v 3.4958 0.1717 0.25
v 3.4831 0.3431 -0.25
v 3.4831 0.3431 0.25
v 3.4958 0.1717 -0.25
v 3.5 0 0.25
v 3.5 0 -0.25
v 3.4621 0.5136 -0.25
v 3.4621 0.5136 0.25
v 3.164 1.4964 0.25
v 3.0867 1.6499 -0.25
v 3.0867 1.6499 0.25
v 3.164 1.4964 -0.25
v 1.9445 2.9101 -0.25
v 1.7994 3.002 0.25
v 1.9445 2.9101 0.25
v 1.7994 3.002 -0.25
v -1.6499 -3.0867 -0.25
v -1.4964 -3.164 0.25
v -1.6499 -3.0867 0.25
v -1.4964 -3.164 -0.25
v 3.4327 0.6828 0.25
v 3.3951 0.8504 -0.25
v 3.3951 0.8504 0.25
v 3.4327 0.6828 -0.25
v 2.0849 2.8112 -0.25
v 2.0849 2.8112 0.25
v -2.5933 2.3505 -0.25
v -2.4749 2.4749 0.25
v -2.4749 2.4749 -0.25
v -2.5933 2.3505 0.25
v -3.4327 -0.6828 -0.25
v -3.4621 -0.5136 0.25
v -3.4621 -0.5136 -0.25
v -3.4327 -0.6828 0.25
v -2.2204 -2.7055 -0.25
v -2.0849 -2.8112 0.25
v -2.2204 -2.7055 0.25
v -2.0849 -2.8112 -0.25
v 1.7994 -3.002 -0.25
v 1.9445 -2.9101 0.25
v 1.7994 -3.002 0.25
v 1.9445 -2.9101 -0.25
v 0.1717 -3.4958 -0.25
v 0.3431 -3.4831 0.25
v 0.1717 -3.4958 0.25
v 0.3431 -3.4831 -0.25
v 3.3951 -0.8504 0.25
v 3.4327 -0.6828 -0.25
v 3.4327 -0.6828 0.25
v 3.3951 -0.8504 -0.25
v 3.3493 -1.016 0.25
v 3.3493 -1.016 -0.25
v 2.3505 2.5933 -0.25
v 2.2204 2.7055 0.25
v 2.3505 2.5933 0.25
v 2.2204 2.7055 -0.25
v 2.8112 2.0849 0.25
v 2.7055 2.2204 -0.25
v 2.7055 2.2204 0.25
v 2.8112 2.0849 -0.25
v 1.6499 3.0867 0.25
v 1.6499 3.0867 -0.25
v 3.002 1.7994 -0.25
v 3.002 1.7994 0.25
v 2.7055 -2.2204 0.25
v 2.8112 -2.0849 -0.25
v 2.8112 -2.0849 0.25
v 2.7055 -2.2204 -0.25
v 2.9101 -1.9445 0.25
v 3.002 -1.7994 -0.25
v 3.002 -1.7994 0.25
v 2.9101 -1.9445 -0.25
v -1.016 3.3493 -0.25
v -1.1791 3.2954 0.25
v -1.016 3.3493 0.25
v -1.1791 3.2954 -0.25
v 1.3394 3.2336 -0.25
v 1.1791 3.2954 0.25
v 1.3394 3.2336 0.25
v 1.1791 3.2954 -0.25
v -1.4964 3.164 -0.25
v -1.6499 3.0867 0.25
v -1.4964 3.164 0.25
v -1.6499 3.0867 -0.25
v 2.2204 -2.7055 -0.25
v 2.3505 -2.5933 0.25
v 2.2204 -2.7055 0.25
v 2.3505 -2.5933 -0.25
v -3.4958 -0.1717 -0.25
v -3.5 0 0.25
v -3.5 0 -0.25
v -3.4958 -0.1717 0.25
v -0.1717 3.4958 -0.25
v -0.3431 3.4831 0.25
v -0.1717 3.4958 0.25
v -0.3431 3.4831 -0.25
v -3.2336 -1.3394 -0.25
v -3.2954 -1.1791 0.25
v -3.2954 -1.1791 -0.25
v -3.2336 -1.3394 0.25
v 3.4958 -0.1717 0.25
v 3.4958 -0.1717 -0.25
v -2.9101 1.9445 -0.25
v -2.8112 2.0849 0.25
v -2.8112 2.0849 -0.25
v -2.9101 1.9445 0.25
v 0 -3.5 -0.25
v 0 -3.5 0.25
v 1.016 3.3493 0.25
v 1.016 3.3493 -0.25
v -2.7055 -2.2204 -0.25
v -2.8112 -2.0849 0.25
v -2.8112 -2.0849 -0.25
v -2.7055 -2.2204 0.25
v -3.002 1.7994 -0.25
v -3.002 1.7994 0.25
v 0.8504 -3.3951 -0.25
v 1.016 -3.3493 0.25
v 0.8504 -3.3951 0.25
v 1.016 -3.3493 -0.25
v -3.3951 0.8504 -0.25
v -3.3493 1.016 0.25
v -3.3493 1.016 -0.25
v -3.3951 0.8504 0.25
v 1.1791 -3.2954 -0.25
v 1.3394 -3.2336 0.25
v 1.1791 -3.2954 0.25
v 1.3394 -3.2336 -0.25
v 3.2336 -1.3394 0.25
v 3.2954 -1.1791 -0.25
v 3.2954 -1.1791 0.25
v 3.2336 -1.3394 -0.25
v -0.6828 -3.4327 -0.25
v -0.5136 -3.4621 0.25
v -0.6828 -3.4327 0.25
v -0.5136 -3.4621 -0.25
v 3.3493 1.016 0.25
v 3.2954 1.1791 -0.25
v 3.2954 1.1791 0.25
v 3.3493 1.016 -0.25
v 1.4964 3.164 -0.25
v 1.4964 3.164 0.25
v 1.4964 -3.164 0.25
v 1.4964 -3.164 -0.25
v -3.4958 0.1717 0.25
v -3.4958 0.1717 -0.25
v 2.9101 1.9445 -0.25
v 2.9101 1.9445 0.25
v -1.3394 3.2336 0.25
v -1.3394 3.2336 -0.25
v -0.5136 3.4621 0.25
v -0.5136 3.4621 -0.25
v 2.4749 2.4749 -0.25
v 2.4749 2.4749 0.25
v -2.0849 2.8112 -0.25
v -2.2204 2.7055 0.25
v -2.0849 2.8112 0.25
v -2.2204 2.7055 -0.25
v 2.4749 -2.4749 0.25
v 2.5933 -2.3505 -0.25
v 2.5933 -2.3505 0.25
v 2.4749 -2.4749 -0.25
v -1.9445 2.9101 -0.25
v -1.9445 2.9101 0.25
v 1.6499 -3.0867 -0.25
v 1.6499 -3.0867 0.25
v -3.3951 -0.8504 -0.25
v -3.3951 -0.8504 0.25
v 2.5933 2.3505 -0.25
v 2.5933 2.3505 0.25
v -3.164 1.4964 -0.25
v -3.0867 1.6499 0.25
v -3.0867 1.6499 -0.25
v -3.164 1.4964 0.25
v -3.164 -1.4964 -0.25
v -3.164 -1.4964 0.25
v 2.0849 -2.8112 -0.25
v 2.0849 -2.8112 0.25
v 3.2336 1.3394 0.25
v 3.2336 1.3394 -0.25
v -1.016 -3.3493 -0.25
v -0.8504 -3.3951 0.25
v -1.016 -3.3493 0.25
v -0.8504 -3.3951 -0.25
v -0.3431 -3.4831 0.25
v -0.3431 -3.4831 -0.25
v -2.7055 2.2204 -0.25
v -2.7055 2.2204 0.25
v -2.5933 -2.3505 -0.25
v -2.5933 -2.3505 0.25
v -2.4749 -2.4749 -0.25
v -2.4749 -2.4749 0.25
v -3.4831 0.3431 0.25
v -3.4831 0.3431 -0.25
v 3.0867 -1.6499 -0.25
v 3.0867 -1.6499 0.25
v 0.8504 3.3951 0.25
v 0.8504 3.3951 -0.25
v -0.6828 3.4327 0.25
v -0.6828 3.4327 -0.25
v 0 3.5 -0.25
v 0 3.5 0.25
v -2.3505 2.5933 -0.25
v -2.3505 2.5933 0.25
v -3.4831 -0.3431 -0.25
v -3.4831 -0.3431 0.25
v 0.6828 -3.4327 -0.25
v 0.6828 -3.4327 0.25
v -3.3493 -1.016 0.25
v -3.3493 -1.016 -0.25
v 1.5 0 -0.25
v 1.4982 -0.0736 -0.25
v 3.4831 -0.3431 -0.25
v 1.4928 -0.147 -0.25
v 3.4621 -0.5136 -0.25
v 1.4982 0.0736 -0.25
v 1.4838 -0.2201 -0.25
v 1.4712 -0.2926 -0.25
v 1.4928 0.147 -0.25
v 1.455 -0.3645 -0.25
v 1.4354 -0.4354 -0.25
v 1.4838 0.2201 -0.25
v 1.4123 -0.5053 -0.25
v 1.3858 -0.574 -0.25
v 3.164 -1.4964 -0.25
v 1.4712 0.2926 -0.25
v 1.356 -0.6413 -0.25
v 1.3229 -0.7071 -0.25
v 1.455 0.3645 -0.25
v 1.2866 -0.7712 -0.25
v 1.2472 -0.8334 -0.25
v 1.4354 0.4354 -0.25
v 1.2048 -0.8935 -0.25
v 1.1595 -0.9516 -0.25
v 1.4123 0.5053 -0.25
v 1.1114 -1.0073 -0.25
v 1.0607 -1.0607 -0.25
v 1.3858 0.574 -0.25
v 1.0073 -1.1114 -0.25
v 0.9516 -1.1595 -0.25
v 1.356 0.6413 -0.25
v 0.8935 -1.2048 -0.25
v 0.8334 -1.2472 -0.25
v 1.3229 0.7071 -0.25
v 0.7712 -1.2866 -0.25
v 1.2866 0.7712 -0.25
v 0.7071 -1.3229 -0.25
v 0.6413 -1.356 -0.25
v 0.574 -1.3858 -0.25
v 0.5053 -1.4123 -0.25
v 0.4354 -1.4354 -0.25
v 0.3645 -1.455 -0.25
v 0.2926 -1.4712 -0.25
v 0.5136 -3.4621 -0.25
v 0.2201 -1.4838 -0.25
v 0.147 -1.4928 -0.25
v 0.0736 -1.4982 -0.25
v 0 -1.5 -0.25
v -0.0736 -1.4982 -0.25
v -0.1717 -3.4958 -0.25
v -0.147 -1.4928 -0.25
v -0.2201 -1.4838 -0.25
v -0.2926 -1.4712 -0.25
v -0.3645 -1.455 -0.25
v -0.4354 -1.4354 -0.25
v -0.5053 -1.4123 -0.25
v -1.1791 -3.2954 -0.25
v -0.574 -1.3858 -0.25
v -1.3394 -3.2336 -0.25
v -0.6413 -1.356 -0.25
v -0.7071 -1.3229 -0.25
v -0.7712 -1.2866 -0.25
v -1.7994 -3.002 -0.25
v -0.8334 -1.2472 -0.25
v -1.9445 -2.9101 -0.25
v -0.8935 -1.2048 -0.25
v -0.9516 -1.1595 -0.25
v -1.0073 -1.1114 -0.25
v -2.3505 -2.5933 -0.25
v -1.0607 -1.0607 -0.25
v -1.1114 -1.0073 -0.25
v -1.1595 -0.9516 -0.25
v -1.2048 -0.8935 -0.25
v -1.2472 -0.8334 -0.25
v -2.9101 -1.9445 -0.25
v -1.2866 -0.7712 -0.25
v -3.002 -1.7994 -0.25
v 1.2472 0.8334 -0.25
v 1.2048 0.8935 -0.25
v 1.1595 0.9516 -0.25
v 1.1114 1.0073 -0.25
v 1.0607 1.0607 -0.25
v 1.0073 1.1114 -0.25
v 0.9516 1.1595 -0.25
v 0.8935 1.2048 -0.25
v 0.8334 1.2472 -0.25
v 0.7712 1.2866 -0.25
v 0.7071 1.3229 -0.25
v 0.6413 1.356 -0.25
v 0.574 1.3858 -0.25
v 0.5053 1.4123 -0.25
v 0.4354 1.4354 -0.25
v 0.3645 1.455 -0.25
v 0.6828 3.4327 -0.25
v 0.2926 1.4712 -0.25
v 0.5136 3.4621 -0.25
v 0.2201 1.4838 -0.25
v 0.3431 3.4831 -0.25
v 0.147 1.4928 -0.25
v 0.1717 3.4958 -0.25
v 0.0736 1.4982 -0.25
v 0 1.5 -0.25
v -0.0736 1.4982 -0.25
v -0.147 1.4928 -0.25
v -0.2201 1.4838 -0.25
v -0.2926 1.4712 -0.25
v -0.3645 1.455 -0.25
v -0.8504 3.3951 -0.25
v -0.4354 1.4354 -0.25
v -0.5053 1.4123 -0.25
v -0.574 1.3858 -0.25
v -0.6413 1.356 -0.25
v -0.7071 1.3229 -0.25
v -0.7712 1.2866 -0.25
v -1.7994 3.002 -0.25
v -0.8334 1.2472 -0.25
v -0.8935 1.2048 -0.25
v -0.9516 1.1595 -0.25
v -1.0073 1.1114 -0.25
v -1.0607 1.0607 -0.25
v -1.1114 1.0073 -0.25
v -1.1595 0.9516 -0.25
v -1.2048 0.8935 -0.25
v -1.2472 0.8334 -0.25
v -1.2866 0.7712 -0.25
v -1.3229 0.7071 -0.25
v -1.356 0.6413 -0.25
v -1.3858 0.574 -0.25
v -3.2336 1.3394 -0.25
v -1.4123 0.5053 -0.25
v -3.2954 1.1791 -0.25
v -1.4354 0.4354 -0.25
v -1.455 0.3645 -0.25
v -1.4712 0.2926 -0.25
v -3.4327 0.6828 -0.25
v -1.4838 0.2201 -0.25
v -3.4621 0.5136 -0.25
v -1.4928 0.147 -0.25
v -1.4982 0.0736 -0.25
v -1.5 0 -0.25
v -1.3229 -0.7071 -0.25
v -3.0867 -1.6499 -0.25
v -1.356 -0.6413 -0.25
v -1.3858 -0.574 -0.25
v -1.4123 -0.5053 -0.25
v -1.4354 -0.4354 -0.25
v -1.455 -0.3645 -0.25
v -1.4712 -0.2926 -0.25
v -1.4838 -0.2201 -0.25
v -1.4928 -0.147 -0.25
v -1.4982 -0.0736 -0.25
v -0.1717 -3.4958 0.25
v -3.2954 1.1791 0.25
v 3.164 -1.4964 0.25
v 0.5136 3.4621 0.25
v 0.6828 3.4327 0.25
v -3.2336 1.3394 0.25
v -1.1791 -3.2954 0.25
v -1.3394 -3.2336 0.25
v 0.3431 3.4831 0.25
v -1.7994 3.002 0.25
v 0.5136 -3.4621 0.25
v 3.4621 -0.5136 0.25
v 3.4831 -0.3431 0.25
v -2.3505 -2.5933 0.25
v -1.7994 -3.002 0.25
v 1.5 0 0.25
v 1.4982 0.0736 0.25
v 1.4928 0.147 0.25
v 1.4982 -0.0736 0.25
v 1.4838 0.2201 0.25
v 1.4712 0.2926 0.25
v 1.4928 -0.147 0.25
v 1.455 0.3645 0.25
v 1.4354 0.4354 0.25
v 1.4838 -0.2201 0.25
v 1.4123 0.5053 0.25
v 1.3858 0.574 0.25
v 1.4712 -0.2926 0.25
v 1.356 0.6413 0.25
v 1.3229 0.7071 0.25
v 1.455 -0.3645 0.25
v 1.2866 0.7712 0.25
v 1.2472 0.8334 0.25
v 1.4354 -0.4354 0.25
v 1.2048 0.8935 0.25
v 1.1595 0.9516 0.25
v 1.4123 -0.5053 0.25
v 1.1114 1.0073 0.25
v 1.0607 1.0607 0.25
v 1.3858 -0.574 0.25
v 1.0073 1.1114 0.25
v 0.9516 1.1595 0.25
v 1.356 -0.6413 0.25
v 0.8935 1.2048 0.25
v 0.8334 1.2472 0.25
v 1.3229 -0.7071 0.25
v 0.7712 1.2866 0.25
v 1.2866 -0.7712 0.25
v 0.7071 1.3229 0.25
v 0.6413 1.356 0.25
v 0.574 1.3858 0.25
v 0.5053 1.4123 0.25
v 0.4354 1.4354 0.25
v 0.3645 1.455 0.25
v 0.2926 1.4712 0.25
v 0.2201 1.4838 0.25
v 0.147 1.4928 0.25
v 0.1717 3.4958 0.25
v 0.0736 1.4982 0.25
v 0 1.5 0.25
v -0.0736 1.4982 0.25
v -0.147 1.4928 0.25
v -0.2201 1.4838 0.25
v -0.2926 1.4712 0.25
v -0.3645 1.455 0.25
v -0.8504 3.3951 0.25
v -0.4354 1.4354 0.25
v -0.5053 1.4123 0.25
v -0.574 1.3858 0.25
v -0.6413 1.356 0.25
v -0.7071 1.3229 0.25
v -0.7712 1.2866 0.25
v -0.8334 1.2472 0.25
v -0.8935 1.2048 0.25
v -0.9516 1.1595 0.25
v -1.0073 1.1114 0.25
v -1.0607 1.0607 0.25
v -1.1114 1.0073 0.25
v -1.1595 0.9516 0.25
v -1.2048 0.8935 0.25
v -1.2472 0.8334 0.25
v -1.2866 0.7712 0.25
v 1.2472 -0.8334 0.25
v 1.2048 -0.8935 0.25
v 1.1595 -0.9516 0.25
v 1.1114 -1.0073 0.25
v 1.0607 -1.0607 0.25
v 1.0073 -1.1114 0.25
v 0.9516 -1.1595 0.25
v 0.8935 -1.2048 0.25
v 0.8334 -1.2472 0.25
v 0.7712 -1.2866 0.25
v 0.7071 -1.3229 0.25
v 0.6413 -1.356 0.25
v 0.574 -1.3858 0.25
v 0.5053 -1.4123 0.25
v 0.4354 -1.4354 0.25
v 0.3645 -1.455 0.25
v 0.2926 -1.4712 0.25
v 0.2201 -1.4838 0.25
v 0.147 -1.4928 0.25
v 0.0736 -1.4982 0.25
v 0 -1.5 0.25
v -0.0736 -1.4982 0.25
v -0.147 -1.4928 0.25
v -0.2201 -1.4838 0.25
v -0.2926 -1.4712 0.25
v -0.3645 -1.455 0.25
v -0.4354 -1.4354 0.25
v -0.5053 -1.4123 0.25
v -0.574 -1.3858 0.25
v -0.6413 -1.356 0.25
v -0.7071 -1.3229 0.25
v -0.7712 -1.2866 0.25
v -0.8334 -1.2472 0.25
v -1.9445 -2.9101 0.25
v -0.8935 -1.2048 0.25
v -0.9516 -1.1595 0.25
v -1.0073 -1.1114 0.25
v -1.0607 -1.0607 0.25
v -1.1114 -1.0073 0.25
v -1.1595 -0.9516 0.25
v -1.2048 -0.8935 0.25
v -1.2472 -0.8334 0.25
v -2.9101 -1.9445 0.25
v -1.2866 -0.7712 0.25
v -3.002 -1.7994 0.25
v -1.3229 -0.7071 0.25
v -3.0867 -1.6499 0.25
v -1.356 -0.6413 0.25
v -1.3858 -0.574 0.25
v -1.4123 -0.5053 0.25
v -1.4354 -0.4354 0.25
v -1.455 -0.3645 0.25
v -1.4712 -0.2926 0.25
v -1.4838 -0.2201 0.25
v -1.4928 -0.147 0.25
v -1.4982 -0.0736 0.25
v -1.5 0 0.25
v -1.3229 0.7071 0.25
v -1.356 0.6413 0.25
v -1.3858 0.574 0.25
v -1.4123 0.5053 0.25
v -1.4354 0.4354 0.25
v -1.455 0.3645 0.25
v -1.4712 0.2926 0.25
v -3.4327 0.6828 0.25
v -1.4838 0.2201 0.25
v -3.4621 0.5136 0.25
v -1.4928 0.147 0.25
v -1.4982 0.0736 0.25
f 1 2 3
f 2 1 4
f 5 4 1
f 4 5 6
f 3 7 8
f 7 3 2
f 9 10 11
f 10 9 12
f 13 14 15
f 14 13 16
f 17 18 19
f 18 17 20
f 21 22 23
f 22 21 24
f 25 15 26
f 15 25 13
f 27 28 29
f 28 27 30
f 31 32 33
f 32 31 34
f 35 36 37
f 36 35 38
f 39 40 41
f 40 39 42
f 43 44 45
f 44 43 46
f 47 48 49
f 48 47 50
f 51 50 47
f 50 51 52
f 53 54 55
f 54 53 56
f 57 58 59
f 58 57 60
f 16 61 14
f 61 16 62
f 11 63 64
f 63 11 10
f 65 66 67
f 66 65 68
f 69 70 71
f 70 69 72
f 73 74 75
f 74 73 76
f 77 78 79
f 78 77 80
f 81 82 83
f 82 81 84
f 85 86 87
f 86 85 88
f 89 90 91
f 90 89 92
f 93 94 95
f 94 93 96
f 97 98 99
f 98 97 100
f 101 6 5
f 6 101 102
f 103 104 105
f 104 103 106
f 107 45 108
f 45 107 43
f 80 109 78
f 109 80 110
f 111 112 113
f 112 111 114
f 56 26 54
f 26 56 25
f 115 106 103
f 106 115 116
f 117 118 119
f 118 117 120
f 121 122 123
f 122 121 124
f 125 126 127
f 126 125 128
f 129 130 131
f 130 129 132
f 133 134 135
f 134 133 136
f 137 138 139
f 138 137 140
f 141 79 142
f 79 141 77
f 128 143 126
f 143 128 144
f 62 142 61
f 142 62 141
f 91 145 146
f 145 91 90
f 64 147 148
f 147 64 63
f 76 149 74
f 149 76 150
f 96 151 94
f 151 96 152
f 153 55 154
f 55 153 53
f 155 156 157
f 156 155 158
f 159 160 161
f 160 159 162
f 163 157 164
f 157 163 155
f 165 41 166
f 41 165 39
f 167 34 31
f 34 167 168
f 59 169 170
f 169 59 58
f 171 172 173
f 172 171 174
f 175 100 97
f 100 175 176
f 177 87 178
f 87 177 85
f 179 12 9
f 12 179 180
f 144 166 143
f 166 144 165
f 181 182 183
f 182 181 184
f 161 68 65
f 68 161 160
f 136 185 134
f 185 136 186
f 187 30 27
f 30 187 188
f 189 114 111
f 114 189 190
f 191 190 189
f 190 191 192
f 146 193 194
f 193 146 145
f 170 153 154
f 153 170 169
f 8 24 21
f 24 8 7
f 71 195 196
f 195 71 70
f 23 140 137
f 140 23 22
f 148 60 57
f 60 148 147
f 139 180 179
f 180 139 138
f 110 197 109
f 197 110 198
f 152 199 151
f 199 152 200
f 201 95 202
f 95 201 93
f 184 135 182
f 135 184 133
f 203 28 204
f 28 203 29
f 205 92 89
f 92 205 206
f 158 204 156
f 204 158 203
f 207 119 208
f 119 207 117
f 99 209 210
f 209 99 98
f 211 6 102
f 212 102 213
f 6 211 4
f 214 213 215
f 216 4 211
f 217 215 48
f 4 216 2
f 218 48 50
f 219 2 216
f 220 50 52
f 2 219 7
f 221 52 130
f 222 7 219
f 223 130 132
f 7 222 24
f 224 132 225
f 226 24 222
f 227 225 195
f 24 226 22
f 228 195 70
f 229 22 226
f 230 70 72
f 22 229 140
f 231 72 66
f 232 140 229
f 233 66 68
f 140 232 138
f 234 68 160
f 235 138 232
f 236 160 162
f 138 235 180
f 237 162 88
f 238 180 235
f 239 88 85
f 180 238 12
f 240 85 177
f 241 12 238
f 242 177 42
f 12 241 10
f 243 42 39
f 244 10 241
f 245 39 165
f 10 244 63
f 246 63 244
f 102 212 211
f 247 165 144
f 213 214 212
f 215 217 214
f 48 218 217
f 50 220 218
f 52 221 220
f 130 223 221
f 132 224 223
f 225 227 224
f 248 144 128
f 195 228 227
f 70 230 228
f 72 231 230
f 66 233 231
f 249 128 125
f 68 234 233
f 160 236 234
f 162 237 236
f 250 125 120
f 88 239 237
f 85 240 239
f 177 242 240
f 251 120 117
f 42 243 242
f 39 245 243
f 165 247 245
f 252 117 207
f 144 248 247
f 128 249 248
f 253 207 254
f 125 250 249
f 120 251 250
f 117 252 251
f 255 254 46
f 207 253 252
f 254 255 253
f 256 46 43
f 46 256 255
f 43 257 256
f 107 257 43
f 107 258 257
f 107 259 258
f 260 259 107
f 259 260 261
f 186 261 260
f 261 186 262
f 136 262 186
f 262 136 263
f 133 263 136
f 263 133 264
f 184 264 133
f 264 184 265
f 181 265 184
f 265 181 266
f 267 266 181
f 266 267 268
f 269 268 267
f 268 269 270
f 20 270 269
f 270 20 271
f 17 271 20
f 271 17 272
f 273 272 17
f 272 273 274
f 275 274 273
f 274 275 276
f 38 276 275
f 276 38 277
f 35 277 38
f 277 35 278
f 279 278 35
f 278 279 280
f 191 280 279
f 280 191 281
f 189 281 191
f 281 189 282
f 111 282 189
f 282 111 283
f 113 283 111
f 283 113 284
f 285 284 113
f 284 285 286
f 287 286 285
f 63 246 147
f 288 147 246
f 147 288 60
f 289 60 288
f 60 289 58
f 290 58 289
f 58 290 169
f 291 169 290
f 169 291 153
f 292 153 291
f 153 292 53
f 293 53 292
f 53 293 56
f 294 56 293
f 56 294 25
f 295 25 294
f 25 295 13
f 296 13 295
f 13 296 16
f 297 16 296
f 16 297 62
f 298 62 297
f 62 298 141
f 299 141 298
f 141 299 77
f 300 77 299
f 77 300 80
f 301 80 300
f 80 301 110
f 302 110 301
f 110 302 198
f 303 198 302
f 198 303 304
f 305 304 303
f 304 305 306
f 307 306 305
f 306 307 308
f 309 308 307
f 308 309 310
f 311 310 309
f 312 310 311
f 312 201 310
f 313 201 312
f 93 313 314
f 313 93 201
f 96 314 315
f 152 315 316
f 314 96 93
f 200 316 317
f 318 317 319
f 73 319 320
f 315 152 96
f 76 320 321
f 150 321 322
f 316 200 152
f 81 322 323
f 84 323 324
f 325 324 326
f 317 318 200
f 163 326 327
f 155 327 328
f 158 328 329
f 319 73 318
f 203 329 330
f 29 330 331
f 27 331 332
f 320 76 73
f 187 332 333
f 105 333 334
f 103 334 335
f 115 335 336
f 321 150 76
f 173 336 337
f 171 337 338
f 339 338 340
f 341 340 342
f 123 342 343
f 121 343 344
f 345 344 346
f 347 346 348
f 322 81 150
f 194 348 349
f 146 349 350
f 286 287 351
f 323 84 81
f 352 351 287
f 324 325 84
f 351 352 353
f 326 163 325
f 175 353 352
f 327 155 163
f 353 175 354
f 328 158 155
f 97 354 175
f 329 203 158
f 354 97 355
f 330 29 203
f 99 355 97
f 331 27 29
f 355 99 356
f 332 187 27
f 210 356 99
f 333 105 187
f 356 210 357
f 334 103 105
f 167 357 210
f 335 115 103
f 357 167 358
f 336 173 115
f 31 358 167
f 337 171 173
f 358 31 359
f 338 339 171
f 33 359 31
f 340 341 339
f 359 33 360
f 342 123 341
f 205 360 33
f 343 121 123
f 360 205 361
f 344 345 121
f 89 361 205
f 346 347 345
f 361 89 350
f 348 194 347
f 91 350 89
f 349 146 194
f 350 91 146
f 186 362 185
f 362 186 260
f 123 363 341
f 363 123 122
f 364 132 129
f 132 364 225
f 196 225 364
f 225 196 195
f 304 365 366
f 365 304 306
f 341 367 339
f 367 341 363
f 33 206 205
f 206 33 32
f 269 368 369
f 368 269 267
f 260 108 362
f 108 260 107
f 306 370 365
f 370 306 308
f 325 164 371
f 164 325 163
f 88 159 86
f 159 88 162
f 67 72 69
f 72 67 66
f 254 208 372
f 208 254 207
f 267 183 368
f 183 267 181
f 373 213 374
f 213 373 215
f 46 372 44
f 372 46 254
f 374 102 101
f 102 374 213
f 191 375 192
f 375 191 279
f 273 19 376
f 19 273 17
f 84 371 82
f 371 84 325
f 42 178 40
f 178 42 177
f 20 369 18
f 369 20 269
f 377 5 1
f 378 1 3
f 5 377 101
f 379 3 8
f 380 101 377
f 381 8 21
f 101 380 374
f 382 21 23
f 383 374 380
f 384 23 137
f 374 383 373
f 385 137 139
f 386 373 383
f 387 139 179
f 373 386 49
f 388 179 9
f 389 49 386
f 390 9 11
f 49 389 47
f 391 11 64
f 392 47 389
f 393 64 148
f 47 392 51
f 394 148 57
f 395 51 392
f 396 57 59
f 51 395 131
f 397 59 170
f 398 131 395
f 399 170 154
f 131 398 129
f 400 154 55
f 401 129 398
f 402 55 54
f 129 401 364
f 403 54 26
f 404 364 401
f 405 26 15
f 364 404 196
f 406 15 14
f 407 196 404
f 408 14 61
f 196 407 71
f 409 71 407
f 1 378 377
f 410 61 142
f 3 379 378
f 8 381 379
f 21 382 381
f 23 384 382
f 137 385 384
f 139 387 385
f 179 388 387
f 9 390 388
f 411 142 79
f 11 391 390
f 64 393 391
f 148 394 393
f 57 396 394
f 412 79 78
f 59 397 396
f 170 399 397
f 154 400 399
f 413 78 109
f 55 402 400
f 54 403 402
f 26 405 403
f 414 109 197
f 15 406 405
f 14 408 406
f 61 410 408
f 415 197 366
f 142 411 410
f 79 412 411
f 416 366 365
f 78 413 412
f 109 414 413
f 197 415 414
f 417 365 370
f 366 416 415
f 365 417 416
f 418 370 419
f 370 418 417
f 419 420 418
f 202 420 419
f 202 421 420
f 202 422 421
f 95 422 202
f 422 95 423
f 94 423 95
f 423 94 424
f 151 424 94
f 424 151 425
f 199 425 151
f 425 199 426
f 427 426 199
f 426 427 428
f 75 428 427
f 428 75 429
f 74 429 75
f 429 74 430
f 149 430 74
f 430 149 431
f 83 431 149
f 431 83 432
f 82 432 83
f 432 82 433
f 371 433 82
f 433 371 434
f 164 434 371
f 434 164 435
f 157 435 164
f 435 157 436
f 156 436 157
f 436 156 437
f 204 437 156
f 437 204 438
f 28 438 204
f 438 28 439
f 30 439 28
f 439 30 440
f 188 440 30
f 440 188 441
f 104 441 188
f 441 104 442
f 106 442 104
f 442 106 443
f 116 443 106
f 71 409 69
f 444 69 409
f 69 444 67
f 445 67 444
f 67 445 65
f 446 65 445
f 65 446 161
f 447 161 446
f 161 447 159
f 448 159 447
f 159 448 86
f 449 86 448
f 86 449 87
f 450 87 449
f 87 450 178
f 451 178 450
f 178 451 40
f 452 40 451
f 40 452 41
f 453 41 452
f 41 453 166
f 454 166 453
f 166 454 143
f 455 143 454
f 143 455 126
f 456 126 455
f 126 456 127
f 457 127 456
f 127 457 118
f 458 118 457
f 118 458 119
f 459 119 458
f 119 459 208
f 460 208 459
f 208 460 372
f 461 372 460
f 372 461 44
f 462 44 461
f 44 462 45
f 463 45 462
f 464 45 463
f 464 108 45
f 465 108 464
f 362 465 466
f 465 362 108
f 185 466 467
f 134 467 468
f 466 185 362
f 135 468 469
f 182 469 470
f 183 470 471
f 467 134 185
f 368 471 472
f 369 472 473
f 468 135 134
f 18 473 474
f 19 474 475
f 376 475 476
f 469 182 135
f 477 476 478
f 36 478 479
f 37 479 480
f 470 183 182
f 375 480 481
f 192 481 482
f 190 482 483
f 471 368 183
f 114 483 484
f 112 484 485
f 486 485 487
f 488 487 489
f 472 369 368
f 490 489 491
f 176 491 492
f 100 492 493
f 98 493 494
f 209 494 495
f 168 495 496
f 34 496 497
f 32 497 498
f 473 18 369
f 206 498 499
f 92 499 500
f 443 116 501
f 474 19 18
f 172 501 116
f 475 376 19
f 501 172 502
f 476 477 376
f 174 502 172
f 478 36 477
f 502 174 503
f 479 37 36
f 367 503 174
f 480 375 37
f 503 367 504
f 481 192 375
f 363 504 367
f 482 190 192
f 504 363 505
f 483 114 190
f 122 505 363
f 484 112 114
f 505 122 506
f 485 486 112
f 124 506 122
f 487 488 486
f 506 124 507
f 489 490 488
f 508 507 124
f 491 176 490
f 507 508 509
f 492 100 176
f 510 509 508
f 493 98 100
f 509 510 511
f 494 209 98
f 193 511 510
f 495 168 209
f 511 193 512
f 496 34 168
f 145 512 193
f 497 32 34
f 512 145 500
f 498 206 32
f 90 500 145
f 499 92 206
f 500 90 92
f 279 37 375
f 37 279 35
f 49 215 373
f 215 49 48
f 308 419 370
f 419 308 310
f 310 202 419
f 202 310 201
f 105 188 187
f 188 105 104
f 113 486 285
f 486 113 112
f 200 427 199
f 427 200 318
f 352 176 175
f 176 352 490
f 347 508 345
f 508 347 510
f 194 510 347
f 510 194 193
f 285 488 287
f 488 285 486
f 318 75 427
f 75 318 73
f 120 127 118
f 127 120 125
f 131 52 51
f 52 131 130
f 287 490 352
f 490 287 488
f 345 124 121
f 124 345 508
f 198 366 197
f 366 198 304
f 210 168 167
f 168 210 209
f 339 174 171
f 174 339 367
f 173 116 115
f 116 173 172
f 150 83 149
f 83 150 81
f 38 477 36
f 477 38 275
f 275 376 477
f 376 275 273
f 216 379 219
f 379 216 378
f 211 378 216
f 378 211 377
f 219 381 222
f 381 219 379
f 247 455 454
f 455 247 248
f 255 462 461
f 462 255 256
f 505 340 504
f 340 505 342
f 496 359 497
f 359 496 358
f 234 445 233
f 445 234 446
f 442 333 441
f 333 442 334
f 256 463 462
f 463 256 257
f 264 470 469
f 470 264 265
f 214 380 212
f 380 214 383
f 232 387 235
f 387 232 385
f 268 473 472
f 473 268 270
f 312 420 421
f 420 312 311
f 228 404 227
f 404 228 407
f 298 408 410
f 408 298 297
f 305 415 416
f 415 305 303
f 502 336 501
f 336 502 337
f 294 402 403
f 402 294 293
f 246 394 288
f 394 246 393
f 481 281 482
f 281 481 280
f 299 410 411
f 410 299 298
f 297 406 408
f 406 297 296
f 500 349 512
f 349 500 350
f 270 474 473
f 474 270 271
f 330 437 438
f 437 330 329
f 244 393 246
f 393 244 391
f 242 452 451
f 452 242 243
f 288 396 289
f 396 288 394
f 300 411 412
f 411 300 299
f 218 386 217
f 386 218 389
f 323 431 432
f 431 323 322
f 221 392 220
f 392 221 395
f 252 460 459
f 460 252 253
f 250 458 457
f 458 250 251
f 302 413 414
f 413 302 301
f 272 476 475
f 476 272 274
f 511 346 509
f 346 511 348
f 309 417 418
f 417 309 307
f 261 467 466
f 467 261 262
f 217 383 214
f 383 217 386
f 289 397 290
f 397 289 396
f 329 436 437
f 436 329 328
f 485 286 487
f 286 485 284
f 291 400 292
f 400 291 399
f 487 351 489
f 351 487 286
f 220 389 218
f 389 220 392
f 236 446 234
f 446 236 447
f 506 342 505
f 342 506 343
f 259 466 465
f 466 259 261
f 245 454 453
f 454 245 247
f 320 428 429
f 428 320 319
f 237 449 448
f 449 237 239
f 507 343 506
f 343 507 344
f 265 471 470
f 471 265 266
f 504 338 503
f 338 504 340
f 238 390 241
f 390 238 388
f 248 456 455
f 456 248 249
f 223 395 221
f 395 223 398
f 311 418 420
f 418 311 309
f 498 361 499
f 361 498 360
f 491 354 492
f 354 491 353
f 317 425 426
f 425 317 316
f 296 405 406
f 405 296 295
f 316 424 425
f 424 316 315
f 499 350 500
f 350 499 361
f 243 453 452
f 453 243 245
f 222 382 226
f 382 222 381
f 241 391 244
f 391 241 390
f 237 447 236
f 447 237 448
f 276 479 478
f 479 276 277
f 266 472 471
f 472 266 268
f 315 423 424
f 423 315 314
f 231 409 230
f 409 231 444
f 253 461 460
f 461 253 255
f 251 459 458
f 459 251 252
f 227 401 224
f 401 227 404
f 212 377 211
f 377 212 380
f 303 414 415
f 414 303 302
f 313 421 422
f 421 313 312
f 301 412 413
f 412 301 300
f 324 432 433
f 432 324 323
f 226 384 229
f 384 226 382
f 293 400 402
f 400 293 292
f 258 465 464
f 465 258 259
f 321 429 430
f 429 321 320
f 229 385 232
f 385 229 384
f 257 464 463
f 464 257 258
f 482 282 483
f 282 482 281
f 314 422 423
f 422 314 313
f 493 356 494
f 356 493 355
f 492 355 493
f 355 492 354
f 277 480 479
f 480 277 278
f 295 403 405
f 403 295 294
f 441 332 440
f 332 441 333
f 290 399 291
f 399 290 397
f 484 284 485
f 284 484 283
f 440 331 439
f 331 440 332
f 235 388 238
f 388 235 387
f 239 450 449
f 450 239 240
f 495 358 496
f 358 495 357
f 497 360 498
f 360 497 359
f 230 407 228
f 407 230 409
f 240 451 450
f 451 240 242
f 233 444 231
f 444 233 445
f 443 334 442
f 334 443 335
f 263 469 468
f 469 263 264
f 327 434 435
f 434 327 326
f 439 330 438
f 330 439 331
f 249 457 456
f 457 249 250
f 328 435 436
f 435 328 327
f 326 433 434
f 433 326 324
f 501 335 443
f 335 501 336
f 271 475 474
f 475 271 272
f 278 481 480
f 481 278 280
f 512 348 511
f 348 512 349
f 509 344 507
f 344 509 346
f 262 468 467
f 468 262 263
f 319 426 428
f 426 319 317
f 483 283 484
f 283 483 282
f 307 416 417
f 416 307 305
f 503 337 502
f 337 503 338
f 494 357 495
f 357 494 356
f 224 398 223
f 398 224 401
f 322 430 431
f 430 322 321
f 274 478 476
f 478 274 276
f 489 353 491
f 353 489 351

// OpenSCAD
// Flat washer: 3.0mm inner hole, 7.0mm outer diameter, 0.5mm thickness

outer_diameter = 7.0;
inner_diameter = 3.0;
thickness      = 0.5;

$fn = 128;

eps = 0.02; // small overlap to ensure clean boolean

difference() {
    cylinder(r = outer_diameter/2, h = thickness, center = true);
    cylinder(r = inner_diameter/2, h = thickness + 2*eps, center = true);
}
